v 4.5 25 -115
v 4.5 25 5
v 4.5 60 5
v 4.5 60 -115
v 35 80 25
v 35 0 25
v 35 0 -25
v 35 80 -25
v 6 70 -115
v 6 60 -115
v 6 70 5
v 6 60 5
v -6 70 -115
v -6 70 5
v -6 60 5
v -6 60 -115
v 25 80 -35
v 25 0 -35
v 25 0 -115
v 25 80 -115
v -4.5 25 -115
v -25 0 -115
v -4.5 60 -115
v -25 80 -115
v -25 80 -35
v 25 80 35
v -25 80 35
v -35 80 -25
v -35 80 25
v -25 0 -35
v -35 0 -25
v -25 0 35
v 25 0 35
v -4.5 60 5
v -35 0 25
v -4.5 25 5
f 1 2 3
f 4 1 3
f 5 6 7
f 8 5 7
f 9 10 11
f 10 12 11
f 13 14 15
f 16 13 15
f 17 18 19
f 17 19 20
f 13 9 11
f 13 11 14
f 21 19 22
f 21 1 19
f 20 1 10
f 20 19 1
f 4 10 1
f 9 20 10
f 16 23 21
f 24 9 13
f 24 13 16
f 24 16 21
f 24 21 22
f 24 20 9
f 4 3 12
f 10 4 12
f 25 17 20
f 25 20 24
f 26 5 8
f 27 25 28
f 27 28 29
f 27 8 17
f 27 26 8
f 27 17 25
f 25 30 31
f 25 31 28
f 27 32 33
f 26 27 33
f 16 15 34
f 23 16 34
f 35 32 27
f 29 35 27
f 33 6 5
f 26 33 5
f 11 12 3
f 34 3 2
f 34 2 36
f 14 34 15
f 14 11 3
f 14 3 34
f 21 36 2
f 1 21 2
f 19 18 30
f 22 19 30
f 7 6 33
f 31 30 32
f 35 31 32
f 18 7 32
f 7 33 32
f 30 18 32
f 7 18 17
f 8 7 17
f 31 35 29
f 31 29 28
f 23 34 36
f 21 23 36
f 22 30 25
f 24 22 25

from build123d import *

# Parameters (mm, degrees)
SKETCH1_W           = 70
SKETCH1_H           = 70
BOSS_EXTRUDE1_DEPTH = 80
CHAMFER1_SIZE       = 10
SKETCH2_W           = 9
SKETCH2_H           = 35
CUT_EXTRUDE1_DEPTH  = 40
SKETCH3_W           = 50
SKETCH3_H           = 80
BOSS_EXTRUDE2_DEPTH = 80


with BuildPart() as part:
    # Sketch1 → Boss-Extrude1 (new body)
    with BuildSketch(Plane(origin=(0, 0, 0), x_dir=(1, 0, 0), z_dir=(0, 1, 0))):
        Rectangle(SKETCH1_W, SKETCH1_H)
    extrude(amount=BOSS_EXTRUDE1_DEPTH)

    # Chamfer1
    chamfer1_edges = [part.edges().sort_by_distance(p)[0] for p in [
        (35, 40, 35),
        (-35, 40, 35),
        (-35, 40, -35),
        (35, 40, -35),
    ]]
    chamfer(chamfer1_edges, length=CHAMFER1_SIZE)

    # Sketch2 → Cut-Extrude1 (cut)
    with BuildSketch(Plane(origin=(0, 0, -35), x_dir=(-1, 0, 0), z_dir=(0, 0, -1))):
        Polygon((-6, 60), (-4.5, 60), (4.5, 60), (6, 60), (6, 70), (-6, 70), align=None)
        with Locations((0, 42.5)):
            Rectangle(SKETCH2_W, SKETCH2_H)
    extrude(amount=-CUT_EXTRUDE1_DEPTH, mode=Mode.SUBTRACT)

    # Sketch3 → Boss-Extrude2 (add)
    with BuildSketch(Plane(origin=(0, 0, -35), x_dir=(-1, 0, 0), z_dir=(0, 0, -1))):
        with Locations((0, 40)):
            Rectangle(SKETCH3_W, SKETCH3_H)
        Polygon((-6, 60), (-6, 70), (6, 70), (6, 60), (4.5, 60), (4.5, 25), (-4.5, 25), (-4.5, 60), align=None, mode=Mode.SUBTRACT)
    extrude(amount=BOSS_EXTRUDE2_DEPTH)


solid = part.part
